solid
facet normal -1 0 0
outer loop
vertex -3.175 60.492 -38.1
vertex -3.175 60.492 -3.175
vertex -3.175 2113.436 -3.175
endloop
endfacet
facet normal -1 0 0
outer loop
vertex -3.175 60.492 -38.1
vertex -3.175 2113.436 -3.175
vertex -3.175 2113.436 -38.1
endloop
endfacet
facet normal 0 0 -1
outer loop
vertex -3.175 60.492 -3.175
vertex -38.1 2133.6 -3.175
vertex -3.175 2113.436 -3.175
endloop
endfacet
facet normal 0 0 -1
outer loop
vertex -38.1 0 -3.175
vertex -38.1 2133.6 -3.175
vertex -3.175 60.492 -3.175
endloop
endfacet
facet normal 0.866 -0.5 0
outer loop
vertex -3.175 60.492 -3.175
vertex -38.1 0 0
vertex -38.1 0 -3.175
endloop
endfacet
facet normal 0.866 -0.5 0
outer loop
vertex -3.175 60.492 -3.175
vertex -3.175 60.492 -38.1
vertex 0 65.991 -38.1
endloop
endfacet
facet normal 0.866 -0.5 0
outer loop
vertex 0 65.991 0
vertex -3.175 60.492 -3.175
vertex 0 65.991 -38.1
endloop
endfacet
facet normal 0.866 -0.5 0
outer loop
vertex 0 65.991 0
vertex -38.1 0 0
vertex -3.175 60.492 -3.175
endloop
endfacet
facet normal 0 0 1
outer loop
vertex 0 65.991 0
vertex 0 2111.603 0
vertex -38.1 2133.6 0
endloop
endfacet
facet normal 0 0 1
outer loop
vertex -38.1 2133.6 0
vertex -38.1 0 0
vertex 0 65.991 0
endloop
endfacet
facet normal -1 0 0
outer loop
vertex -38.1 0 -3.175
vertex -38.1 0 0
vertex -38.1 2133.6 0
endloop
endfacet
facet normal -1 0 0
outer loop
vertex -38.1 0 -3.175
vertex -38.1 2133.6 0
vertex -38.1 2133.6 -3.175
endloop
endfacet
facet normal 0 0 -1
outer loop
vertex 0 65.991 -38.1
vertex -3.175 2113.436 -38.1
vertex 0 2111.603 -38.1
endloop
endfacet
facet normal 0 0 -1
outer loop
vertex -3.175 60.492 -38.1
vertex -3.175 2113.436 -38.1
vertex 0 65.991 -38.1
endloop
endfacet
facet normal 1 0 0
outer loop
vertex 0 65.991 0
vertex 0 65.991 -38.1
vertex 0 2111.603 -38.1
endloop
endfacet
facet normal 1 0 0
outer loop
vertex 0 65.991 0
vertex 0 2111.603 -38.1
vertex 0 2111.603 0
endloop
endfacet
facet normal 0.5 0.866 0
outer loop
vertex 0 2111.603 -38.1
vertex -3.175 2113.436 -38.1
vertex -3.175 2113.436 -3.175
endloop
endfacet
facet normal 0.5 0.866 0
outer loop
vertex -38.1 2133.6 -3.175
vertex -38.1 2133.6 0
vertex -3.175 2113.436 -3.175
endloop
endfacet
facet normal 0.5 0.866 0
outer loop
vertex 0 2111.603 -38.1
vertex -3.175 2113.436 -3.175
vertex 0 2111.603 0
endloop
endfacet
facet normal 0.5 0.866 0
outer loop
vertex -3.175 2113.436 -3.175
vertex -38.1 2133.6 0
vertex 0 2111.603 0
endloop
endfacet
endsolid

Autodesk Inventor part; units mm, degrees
ref_plane "YZ Plane" through (0, 0, 0) normal (1, 0, 0) x (0, 1, 0)
ref_plane "XZ Plane" through (0, 0, 0) normal (0, 1, 0) x (-1, 0, 0)
ref_plane "XY Plane" through (0, 0, 0) normal (0, 0, 1) x (1, 0, 0)
sketch "Sketch1" plane through (0, 0, 0) normal (0, 1, 0) x (-1, 0, 0)
  line L0 (0, 0) -> (38.1, 0)
  line L1 (38.1, 0) -> (38.1, -3.175)
  line L2 (38.1, -3.175) -> (3.175, -3.175)
  line L3 (3.175, -3.175) -> (3.175, -38.1)
  line L4 (3.175, -38.1) -> (0, -38.1)
  line L5 (0, -38.1) -> (0, 0)
  dimension "d0" = 3.175
  dimension "d1" = 3.175
  dimension "d2" = 38.1
  dimension "d3" = 38.1
extrude "Extrusion1" add sketch "Sketch1" along normal blind 2133.6
sketch "Sketch2" plane through (0, 0, 0) normal (0, 0, 1) x (1, 0, 0)
  line L0 (0, 0) -> (-38.1, 0) projected
  line L1 (-38.1, 0) -> (0, 0)
  line L2 (0, 0) -> (-38.1, 0)
  line L3 (-38.1, 0) -> (0, 65.9911)
  line L4 (0, 0) -> (0, 2133.6) projected
  line L5 (-38.1, 0) -> (-38.1, 2133.6) projected
  line L6 (-38.1, 2133.6) -> (0, 2111.603)
  line L7 (-38.1, 2133.6) -> (0, 2133.6) projected
  line L8 (0, 2111.603) -> (0, 2133.6)
  line L9 (0, 2133.6) -> (-38.1, 2133.6)
  dimension "d6" = 60
  dimension "d7" = 60
extrude "Extrusion2" cut sketch "Sketch2" against normal blind 76.2 contours L0 L3 L4
extrude "Extrusion3" cut sketch "Sketch2" against normal blind 76.2 contours L7 L4 L6
properties part number "Angle_Brace"
